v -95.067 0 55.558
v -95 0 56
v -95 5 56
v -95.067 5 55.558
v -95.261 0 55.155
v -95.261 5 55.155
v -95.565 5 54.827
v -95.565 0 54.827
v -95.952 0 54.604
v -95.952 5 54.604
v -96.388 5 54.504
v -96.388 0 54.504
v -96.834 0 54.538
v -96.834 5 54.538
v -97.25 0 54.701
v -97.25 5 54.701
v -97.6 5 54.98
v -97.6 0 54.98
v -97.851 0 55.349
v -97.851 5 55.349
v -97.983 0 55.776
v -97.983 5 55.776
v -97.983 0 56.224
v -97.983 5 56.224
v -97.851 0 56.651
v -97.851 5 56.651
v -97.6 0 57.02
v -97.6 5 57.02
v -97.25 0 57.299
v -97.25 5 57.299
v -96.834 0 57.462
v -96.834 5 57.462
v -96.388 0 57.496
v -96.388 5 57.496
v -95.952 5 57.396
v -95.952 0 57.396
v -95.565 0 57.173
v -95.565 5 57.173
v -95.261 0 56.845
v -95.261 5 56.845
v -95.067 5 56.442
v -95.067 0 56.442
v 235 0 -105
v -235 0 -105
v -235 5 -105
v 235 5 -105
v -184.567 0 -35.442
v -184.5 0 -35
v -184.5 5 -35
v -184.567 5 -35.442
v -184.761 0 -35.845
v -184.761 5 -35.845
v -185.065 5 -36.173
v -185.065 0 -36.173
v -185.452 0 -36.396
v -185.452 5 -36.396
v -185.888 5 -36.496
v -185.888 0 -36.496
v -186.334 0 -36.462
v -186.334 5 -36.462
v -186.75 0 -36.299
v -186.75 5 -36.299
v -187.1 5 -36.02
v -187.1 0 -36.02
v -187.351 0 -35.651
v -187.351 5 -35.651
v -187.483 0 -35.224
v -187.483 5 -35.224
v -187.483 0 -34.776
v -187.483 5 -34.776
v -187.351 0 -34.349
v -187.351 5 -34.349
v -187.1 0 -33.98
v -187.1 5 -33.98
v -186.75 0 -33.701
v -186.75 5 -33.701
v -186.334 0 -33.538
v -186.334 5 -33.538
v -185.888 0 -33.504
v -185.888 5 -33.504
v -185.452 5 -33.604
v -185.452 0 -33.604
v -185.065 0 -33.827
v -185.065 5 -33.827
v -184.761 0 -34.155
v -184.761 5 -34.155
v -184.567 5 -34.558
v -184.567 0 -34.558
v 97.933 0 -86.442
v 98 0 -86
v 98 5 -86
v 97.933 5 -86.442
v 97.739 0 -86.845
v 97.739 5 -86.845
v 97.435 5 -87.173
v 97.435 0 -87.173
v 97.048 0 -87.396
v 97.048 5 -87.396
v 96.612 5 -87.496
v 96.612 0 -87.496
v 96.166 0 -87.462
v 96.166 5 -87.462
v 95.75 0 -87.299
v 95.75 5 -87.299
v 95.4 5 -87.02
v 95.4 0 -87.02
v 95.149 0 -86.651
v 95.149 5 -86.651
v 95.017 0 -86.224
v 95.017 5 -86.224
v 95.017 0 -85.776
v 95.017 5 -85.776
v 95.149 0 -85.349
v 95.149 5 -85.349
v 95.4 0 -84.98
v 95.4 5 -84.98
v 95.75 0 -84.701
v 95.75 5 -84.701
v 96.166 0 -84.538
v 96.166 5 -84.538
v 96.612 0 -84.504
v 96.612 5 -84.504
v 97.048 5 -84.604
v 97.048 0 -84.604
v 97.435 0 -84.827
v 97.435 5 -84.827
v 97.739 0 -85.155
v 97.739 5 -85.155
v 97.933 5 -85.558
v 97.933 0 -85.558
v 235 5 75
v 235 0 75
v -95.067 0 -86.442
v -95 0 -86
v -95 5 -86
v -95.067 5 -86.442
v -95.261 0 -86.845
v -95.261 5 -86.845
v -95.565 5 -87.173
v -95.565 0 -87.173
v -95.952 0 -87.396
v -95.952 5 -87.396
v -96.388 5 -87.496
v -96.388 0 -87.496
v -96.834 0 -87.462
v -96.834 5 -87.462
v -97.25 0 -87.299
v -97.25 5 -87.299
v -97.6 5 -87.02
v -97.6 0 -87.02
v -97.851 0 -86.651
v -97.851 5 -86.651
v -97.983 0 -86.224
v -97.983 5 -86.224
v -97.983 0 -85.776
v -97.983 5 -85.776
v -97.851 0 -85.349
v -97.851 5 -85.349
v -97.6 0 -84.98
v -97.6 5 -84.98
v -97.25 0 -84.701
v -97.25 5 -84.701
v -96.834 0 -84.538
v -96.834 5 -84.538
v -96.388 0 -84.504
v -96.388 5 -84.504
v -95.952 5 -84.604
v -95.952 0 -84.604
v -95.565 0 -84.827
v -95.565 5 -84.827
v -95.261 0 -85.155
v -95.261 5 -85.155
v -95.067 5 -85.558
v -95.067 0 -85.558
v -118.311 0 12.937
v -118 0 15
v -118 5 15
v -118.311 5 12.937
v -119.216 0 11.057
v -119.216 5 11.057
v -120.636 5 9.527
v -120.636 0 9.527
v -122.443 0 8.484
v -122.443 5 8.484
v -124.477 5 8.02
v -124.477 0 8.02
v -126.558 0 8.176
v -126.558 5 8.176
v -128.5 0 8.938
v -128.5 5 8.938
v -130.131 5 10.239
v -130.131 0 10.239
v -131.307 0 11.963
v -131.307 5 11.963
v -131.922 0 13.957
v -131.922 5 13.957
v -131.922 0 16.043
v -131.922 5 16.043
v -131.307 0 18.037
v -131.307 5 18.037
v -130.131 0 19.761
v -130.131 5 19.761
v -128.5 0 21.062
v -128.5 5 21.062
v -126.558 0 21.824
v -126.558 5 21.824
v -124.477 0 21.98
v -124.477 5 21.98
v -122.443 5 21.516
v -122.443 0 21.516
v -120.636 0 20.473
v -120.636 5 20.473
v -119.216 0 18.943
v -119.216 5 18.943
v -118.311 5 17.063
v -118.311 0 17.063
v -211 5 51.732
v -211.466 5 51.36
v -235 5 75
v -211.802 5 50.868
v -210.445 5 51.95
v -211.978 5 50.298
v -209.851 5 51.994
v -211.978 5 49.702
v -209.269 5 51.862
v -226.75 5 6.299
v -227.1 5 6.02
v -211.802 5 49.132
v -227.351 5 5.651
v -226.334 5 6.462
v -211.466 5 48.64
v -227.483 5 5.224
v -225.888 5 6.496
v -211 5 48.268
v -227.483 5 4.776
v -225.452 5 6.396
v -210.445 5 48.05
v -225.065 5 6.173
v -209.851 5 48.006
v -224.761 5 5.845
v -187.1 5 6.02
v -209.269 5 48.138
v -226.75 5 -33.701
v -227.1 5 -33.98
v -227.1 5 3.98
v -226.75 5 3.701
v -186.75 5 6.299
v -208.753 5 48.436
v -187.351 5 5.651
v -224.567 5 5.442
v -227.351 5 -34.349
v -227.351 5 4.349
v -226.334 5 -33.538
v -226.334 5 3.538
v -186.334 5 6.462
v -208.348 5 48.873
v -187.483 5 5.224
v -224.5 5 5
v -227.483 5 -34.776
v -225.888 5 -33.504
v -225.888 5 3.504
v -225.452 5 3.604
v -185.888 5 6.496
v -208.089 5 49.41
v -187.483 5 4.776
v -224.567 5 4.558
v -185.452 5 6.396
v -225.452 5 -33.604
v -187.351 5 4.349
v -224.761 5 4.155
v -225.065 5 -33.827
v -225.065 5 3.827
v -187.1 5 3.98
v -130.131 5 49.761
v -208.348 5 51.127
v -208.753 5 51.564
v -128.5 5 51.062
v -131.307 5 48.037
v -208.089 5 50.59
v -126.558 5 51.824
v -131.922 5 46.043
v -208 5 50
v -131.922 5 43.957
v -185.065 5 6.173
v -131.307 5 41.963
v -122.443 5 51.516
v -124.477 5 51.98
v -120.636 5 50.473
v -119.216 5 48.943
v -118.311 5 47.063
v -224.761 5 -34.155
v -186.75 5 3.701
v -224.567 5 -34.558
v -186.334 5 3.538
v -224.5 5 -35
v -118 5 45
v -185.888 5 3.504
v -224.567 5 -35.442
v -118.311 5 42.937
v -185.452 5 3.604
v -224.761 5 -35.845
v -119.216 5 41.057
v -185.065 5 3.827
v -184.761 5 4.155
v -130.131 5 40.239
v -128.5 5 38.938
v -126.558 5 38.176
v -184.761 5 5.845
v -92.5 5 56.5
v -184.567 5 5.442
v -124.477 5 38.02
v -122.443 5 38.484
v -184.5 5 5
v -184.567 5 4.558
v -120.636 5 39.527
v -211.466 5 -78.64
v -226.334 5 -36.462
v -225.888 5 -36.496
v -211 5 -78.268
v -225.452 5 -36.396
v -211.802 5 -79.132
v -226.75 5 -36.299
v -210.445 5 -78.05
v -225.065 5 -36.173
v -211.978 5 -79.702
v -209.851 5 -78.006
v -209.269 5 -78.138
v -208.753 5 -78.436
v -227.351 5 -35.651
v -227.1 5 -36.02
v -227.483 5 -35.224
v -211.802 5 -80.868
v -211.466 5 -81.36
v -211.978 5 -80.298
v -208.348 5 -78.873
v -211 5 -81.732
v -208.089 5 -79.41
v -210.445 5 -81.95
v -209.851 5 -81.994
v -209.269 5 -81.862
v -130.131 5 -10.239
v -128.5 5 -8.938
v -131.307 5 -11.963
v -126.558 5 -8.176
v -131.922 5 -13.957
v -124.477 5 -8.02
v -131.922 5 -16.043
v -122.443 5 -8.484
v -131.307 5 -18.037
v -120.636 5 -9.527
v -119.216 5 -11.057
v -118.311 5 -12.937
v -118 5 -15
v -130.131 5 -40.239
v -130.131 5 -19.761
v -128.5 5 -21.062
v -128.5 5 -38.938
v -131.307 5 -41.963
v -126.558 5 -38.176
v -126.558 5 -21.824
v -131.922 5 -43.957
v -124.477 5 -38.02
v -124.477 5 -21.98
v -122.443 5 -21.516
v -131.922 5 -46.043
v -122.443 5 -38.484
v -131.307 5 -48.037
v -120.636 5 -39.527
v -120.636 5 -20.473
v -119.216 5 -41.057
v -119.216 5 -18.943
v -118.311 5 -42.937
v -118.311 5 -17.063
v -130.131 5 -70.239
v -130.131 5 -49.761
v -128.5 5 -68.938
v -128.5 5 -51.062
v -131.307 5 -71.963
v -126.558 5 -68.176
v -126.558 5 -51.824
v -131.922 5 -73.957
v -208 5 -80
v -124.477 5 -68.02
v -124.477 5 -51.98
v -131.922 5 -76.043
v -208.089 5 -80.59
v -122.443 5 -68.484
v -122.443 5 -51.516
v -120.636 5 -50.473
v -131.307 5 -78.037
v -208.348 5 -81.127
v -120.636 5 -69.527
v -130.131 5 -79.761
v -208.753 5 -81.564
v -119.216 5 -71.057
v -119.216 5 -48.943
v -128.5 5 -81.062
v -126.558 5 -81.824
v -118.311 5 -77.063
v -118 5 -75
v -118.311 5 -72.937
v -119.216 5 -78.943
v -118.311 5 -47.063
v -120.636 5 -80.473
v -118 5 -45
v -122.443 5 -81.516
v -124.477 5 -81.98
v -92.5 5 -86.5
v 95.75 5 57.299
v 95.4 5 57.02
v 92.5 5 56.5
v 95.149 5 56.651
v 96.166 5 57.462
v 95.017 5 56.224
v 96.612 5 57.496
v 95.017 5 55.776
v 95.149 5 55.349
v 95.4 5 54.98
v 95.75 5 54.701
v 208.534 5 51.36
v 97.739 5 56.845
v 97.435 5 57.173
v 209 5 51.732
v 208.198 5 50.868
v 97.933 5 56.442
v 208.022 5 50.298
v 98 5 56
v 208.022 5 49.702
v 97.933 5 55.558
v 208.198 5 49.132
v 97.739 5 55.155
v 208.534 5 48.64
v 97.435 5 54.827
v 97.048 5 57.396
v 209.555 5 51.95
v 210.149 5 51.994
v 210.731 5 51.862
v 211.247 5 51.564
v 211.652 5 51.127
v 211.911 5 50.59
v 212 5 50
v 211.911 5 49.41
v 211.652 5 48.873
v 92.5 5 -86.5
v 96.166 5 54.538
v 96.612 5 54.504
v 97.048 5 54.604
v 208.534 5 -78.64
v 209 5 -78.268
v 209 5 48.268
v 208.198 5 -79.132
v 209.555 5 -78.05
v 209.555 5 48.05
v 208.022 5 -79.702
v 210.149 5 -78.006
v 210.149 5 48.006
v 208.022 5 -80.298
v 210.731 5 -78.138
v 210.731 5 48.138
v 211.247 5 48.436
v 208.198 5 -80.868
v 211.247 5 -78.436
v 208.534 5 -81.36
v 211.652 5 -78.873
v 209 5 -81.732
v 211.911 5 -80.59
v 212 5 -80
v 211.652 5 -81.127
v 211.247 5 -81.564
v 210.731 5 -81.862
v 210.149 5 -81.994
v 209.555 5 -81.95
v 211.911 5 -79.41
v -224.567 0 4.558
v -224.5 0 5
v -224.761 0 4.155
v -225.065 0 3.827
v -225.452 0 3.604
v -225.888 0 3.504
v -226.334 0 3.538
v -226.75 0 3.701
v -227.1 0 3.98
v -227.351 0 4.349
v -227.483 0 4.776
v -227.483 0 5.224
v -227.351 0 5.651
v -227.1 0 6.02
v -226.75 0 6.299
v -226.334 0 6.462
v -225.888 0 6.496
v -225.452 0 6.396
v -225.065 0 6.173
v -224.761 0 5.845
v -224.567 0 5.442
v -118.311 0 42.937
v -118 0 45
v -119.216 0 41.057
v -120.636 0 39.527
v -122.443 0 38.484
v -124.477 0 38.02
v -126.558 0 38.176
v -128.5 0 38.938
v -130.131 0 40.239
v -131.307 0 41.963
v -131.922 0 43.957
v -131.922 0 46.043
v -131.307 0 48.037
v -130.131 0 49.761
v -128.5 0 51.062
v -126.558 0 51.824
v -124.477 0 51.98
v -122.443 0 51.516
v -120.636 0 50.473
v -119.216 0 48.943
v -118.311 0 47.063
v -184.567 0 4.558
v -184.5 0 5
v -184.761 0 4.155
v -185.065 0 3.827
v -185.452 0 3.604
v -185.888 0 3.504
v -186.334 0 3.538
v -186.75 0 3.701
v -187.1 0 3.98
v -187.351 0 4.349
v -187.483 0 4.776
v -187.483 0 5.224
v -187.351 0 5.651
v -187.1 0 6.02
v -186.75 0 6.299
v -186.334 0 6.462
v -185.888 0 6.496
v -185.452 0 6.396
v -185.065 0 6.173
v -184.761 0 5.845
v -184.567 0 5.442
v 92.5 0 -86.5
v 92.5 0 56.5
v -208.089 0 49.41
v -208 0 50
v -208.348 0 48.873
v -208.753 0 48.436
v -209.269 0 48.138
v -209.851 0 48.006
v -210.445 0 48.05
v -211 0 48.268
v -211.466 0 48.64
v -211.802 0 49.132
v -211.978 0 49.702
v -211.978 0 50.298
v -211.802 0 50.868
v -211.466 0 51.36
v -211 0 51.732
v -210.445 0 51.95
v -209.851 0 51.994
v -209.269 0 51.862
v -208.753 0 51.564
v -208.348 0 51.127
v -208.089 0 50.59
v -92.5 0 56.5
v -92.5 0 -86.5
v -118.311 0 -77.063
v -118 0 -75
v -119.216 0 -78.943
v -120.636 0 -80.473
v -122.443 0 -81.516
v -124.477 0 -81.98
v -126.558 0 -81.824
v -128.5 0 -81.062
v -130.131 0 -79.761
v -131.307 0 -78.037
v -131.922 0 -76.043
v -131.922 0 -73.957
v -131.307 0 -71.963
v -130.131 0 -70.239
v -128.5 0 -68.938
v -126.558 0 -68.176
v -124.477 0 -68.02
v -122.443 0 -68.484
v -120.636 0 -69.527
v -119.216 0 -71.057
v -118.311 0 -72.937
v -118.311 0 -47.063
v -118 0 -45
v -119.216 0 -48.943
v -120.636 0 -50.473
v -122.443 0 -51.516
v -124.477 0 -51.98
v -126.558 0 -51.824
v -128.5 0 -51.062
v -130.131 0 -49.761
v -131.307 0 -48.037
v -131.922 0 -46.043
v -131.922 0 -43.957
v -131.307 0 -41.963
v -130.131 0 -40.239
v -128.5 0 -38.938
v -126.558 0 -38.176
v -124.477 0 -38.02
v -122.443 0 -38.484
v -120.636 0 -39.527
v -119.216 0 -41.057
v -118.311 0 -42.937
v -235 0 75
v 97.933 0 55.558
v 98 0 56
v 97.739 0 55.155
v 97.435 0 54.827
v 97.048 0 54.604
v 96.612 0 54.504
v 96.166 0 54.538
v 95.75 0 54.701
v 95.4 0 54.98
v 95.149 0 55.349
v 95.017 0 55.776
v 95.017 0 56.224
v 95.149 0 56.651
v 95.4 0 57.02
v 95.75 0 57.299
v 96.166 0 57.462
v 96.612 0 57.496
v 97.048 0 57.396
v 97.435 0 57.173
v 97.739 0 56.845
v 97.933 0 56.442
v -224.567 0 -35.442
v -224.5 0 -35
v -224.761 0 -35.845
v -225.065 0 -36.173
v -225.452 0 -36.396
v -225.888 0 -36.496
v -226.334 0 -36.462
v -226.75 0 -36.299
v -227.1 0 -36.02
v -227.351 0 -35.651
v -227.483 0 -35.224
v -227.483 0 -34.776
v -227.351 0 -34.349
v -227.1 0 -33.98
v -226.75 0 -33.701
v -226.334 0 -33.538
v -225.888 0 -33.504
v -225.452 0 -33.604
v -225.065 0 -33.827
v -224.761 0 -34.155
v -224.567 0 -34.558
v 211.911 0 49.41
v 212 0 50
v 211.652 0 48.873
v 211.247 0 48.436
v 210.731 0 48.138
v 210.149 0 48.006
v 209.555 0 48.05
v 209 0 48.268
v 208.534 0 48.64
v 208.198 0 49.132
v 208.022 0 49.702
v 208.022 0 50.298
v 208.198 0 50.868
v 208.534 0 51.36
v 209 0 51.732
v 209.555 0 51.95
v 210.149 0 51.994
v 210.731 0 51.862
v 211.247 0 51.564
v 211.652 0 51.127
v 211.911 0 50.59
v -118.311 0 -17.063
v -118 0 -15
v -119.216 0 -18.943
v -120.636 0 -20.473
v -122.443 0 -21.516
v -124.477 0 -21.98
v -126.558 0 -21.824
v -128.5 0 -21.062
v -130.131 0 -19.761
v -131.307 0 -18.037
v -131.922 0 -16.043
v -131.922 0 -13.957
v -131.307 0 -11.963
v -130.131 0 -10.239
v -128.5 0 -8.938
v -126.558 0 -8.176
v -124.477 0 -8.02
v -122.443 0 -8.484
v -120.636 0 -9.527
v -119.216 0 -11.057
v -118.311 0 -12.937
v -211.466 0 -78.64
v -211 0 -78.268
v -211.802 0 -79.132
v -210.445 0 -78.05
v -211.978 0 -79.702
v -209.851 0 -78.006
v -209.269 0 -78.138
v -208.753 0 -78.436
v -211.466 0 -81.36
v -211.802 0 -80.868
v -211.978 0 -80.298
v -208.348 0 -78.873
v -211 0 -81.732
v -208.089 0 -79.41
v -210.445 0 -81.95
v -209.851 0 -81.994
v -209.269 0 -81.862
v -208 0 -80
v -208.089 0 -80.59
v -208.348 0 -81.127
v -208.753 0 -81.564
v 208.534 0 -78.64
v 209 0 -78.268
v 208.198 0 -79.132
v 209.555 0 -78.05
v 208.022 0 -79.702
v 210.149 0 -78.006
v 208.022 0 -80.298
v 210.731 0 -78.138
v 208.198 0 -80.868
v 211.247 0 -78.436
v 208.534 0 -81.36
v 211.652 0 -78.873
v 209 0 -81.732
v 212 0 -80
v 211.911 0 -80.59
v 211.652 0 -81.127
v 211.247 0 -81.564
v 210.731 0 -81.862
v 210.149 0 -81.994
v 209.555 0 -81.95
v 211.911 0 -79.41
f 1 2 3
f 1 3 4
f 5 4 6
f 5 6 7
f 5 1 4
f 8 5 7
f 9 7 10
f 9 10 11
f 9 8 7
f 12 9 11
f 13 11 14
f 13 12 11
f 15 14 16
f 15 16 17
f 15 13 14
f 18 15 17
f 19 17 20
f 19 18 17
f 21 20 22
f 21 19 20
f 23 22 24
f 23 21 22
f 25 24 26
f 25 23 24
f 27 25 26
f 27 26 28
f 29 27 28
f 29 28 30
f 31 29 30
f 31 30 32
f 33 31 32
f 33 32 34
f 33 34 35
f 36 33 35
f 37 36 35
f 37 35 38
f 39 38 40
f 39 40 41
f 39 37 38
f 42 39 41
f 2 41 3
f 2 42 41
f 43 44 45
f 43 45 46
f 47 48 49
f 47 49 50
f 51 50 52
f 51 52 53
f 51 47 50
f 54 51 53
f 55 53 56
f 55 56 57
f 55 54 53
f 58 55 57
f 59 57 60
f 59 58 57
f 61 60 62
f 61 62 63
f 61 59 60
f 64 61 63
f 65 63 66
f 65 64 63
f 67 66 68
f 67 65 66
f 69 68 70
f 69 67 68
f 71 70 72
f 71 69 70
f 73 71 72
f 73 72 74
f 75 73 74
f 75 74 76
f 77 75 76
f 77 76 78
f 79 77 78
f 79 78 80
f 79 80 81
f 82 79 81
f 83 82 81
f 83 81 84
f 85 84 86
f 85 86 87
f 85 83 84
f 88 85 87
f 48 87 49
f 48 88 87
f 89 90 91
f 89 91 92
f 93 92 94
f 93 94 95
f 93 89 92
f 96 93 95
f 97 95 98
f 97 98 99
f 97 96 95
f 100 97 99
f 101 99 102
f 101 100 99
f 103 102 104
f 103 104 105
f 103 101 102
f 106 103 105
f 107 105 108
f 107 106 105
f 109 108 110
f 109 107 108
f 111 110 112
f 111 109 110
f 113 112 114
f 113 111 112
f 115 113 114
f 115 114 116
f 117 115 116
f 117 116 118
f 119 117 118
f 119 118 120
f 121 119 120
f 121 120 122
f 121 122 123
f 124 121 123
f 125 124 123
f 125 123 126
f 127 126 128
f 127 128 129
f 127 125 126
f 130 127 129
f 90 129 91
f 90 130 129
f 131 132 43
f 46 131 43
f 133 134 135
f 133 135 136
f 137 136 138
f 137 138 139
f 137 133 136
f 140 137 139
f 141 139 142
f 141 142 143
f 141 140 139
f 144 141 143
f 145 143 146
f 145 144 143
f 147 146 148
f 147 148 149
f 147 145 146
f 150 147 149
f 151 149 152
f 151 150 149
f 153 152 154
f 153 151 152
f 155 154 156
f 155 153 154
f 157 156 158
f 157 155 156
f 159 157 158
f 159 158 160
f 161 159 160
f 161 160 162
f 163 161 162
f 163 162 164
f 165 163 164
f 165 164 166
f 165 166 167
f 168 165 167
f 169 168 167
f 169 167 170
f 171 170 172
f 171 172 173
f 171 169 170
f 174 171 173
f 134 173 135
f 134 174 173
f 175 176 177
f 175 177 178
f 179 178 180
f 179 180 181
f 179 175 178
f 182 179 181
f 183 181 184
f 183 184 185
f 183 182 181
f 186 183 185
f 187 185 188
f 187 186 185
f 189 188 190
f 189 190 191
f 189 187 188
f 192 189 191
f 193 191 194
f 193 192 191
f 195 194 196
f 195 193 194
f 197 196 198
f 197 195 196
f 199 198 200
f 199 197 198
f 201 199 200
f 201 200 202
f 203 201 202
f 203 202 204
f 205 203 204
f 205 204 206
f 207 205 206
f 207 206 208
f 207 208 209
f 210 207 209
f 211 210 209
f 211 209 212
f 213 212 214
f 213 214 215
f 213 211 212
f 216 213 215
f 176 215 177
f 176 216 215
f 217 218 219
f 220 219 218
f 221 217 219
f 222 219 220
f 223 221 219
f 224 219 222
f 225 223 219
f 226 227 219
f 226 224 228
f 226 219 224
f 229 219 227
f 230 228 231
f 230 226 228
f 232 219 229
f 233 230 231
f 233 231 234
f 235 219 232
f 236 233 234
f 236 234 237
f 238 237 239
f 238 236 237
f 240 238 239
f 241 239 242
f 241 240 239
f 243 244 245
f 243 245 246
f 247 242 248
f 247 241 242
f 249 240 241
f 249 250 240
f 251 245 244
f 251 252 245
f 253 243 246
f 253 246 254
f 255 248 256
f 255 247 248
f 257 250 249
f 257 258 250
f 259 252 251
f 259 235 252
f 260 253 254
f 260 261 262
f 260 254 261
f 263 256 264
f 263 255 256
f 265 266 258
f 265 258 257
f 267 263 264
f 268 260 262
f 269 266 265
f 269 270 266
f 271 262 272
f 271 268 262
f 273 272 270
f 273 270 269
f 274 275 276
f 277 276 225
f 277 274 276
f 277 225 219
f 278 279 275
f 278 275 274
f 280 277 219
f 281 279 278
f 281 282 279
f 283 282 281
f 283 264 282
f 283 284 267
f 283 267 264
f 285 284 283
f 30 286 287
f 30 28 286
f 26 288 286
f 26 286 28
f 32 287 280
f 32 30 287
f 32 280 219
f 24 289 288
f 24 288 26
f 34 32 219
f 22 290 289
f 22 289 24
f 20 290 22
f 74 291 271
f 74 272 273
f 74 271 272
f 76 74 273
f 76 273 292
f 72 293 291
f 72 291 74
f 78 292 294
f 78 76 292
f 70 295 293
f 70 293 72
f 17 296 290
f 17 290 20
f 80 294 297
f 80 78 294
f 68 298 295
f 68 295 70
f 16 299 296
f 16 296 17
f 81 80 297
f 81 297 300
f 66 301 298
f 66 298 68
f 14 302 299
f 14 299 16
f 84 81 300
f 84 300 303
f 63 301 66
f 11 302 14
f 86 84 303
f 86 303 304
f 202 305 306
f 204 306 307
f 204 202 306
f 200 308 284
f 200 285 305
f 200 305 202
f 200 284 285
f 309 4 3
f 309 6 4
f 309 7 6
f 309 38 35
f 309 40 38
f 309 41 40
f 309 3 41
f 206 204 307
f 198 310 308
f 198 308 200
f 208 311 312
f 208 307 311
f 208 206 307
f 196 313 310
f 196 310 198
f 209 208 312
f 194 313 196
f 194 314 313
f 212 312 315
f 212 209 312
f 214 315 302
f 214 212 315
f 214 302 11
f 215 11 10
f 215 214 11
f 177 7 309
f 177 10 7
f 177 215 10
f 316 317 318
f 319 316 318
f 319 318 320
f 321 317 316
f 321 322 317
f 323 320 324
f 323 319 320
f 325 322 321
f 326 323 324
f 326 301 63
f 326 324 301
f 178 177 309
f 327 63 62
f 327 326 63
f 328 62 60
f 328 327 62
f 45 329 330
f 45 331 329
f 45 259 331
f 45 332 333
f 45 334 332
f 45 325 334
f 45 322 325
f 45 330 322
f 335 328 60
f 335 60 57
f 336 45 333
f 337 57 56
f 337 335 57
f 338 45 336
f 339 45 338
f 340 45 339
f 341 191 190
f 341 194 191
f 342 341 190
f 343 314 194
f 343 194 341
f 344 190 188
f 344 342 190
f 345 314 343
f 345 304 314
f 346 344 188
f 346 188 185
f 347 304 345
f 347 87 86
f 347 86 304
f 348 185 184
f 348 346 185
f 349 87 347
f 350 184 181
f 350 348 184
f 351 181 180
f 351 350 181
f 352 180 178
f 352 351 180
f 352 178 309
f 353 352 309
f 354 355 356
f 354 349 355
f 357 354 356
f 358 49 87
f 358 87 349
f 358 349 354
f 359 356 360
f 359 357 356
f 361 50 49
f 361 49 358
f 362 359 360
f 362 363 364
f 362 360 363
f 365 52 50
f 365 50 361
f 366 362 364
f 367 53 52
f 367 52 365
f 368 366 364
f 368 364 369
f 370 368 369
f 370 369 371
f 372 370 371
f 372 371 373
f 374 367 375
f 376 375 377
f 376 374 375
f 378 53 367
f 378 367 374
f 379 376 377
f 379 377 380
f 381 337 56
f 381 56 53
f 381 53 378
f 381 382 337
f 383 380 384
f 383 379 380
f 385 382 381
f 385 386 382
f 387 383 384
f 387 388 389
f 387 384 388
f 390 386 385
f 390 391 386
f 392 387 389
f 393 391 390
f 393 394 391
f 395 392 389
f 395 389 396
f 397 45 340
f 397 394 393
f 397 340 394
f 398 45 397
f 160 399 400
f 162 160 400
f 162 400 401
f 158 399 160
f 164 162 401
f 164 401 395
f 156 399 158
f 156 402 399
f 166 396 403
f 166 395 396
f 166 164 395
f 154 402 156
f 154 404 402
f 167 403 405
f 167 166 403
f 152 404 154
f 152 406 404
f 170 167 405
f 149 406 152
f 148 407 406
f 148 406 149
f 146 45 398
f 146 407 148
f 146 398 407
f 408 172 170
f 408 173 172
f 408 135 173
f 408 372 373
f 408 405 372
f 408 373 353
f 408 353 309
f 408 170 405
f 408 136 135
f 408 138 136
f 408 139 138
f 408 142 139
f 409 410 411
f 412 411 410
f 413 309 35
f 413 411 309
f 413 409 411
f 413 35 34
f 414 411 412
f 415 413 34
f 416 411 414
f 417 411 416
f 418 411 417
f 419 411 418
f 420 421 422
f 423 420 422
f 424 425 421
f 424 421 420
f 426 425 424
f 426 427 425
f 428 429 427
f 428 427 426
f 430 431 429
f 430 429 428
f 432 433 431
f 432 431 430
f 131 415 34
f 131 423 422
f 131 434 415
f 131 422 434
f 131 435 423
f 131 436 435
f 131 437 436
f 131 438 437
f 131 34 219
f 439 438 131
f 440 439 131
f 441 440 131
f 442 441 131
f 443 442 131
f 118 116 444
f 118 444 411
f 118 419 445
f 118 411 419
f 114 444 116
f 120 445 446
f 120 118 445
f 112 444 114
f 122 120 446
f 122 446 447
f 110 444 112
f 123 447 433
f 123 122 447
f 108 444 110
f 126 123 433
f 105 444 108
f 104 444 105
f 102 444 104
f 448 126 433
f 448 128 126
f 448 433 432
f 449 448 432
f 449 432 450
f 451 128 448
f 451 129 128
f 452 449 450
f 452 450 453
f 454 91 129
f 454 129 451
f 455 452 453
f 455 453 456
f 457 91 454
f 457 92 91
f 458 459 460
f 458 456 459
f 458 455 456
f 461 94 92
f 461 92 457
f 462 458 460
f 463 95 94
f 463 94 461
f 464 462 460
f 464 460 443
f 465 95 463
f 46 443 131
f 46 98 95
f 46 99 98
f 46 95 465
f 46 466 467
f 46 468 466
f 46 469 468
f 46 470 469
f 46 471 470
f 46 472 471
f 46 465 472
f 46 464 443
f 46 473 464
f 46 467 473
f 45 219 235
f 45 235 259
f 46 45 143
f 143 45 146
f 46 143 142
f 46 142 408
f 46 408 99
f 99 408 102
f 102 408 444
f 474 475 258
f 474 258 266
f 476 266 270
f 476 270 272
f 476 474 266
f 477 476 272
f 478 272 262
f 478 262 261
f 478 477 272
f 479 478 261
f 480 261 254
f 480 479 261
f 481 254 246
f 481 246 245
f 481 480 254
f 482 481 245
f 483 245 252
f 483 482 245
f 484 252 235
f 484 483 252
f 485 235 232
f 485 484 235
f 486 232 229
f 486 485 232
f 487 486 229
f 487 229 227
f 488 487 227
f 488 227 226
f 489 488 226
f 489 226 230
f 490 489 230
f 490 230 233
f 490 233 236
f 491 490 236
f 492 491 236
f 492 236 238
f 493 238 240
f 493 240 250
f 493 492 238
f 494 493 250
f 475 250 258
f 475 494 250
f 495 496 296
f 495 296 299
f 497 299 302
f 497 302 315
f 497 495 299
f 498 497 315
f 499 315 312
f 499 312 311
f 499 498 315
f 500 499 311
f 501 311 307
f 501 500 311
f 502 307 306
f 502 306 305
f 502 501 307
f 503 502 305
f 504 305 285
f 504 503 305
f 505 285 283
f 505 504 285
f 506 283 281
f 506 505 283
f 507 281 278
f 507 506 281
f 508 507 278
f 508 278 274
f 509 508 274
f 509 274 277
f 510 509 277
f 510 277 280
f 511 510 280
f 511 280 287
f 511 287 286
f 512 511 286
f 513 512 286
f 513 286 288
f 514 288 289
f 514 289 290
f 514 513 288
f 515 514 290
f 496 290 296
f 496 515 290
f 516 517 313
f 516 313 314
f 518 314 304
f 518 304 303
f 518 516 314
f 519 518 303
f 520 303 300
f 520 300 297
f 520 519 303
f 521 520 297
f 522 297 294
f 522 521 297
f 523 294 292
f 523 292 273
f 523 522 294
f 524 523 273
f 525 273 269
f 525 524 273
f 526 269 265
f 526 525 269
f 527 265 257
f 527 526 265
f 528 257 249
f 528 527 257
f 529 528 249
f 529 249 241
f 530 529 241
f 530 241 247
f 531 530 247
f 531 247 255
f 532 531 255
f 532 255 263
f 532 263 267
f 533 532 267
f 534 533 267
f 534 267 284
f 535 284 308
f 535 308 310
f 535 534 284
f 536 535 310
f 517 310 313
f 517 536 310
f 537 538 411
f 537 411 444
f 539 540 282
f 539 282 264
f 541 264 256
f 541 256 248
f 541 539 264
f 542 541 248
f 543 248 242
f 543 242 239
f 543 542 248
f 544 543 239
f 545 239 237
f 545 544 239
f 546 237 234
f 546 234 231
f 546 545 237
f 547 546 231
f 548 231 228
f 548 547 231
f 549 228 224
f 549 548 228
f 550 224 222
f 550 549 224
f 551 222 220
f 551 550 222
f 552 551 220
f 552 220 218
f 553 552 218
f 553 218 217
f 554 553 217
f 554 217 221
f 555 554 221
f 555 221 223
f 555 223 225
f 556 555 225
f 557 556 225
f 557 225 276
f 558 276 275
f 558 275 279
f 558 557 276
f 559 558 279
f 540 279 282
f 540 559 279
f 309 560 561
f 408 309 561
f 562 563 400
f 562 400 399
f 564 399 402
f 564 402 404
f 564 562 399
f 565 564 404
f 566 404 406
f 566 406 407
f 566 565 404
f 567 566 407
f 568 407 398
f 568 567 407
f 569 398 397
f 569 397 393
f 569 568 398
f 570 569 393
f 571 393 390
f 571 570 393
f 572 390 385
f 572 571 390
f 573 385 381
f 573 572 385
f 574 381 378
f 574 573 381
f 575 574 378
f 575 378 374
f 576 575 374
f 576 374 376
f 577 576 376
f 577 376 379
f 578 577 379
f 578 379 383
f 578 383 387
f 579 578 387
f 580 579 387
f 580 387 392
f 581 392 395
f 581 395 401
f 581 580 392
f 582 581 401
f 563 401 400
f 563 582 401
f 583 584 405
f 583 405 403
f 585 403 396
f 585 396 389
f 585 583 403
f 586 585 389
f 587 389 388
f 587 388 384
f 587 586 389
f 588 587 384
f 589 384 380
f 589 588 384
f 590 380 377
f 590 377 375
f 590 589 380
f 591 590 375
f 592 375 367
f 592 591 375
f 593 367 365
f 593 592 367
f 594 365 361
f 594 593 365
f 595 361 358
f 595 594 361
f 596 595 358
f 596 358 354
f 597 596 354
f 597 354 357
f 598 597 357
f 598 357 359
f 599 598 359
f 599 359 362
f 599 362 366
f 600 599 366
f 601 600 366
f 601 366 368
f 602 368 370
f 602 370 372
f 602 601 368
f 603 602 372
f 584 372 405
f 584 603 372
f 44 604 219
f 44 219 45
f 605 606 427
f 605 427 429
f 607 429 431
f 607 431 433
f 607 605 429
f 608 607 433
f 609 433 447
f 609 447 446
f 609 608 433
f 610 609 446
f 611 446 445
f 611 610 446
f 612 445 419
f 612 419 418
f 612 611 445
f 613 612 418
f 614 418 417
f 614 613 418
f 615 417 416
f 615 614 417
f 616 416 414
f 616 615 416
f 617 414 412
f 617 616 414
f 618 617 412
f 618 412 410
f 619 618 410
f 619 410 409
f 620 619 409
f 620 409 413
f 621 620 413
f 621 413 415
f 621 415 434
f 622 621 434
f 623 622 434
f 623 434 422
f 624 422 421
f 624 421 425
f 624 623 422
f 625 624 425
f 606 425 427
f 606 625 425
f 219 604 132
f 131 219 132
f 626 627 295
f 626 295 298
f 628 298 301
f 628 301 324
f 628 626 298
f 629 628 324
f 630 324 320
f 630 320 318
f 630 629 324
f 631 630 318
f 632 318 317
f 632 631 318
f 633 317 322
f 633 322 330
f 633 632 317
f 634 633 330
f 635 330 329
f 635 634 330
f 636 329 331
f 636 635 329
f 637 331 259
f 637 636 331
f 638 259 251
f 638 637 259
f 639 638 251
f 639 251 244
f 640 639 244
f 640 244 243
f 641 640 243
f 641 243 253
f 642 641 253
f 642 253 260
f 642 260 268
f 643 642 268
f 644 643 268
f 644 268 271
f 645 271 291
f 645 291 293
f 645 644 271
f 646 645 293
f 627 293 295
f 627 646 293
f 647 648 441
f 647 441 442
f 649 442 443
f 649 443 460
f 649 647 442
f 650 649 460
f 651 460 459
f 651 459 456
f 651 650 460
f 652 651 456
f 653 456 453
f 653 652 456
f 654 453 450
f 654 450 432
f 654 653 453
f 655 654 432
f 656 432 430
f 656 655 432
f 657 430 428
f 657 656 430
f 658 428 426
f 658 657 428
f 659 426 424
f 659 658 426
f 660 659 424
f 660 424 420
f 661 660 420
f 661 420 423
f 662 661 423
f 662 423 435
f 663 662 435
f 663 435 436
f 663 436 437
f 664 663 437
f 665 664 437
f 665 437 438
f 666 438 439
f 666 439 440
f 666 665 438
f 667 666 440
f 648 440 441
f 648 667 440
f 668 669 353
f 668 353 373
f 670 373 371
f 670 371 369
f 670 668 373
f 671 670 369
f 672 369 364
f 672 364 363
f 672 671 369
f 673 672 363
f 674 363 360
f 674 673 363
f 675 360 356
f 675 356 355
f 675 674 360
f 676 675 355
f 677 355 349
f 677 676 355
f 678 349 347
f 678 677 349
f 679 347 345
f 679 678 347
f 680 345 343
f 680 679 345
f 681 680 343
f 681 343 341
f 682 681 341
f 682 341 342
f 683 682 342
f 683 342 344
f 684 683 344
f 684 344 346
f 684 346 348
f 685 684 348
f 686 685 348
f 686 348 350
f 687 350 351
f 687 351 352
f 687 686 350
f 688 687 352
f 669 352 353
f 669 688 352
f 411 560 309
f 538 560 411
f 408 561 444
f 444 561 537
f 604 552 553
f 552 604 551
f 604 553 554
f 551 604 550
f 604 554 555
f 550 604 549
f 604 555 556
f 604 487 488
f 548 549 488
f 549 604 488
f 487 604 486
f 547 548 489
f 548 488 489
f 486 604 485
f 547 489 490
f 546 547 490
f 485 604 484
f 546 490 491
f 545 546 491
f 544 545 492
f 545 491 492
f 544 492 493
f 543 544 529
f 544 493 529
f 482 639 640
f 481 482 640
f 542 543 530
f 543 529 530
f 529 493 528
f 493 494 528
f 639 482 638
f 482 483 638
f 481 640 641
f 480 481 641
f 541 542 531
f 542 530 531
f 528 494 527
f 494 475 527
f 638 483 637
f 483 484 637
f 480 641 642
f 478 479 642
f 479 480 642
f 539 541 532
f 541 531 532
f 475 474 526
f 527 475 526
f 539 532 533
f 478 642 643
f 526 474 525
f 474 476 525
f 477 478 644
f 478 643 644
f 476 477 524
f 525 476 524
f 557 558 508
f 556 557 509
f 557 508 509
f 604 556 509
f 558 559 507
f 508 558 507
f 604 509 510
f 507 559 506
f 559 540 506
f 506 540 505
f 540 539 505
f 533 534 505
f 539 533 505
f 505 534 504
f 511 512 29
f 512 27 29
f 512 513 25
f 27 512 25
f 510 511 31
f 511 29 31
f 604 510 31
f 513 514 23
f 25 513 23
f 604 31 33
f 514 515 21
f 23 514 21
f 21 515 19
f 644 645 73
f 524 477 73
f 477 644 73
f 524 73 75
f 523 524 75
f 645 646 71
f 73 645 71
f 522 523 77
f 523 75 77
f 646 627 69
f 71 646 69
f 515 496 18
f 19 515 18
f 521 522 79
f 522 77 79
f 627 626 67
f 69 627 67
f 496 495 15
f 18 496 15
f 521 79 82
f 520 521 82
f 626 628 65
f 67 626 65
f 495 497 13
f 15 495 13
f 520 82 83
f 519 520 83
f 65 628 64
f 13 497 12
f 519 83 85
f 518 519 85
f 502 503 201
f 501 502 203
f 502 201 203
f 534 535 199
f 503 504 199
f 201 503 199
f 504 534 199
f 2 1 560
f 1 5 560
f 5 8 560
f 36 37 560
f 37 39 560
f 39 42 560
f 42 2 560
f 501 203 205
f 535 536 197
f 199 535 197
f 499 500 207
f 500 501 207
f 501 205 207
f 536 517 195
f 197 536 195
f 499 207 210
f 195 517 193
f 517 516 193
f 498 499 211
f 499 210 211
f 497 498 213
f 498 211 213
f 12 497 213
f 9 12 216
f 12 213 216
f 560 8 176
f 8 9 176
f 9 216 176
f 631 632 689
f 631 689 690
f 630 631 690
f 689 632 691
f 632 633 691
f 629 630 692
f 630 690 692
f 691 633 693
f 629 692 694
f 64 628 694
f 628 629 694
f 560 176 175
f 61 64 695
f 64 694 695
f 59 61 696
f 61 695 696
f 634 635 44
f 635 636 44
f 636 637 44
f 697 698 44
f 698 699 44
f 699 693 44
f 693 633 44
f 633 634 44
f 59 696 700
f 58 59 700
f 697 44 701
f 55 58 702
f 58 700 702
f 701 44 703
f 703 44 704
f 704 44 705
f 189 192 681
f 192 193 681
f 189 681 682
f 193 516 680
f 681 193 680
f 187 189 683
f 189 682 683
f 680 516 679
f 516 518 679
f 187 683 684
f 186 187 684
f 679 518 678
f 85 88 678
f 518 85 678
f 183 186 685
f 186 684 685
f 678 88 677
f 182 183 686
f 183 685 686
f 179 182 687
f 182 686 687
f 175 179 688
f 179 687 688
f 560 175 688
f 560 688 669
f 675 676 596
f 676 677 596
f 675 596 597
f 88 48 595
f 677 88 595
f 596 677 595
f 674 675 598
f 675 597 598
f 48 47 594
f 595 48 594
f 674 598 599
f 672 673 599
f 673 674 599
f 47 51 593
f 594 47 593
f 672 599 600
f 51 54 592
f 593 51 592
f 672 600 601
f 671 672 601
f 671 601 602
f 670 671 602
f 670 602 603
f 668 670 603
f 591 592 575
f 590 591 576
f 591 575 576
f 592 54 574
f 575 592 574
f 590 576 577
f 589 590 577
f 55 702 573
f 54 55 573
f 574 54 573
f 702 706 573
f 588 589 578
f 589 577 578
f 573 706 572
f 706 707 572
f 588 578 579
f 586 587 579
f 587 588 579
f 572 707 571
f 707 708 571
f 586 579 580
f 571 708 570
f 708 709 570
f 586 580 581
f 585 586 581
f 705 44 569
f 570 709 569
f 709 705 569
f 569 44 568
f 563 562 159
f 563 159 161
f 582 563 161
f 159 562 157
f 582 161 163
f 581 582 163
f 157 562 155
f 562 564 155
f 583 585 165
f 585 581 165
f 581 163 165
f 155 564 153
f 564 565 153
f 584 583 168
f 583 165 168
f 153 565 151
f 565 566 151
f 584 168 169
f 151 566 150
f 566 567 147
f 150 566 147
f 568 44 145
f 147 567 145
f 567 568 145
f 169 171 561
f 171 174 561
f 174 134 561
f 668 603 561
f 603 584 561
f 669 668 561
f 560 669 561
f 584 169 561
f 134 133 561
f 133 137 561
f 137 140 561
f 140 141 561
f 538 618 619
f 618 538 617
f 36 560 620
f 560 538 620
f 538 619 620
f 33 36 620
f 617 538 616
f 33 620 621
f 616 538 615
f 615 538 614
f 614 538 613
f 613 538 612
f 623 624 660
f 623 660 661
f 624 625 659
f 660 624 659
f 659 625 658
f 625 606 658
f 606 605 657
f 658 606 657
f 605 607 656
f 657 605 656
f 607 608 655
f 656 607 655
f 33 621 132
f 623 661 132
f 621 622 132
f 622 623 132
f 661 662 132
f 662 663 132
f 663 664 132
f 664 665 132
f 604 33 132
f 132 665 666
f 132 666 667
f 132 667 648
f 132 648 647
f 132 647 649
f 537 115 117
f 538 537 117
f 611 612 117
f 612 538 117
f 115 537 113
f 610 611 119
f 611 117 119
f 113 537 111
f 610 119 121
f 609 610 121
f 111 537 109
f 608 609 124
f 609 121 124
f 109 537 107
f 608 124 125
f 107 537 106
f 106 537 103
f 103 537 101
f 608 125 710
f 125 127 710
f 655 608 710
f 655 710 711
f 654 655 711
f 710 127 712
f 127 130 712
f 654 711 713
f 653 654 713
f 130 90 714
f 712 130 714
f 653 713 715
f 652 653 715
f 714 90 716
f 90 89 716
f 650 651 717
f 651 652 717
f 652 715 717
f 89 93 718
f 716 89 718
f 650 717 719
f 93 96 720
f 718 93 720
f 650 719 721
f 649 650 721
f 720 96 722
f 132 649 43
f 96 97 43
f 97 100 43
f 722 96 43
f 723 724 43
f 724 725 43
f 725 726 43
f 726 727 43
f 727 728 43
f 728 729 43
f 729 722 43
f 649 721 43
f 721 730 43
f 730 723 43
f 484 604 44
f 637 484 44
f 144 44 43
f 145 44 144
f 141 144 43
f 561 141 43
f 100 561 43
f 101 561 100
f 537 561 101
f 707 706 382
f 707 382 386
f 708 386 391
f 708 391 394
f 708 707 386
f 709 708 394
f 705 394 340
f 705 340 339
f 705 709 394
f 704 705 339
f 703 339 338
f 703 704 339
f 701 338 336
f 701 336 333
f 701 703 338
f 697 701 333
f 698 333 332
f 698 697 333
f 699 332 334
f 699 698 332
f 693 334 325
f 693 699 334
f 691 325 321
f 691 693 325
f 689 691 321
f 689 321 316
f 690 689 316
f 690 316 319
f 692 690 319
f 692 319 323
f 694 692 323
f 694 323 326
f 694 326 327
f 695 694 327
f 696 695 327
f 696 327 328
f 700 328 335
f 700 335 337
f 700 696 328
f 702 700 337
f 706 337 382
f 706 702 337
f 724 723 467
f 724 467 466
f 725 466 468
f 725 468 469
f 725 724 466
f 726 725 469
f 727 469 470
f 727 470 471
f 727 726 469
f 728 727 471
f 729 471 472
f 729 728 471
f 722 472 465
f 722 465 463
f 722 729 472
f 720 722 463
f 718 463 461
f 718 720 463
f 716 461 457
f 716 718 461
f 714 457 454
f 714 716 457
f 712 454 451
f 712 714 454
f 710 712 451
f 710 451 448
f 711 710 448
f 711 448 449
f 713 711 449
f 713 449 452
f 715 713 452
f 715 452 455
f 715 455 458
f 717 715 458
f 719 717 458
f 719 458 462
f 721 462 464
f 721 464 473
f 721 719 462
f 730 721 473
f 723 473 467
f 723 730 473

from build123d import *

# Parameters (mm, degrees)
SKETCH_1_W      = 470
SKETCH_1_H      = 180
SKETCH_1_R      = 1.5
SKETCH_1_R_2    = 7
SKETCH_1_R_3    = 2
SKETCH_1_W_2    = 185
SKETCH_1_H_2    = 143
EXTRUDE_1_DEPTH = 5


with BuildPart() as part:
    # 草图1 → 凸台-拉伸1 (new body)
    with BuildSketch(Plane(origin=(0, 0, 0), x_dir=(1, 0, 0), z_dir=(0, 1, 0))):
        with Locations((0, 15)):
            Rectangle(SKETCH_1_W, SKETCH_1_H)
        with Locations((-96.5, 86)):
            Circle(SKETCH_1_R, mode=Mode.SUBTRACT)
        with Locations((96.5, 86)):
            Circle(SKETCH_1_R, mode=Mode.SUBTRACT)
        with Locations((96.5, -56)):
            Circle(SKETCH_1_R, mode=Mode.SUBTRACT)
        with Locations((-96.5, -56)):
            Circle(SKETCH_1_R, mode=Mode.SUBTRACT)
        with Locations((-125, 75)):
            Circle(SKETCH_1_R_2, mode=Mode.SUBTRACT)
        with Locations((-125, 45)):
            Circle(SKETCH_1_R_2, mode=Mode.SUBTRACT)
        with Locations((-125, 15)):
            Circle(SKETCH_1_R_2, mode=Mode.SUBTRACT)
        with Locations((-125, -15)):
            Circle(SKETCH_1_R_2, mode=Mode.SUBTRACT)
        with Locations((-125, -45)):
            Circle(SKETCH_1_R_2, mode=Mode.SUBTRACT)
        with Locations((-226, 35)):
            Circle(SKETCH_1_R, mode=Mode.SUBTRACT)
        with Locations((-186, 35)):
            Circle(SKETCH_1_R, mode=Mode.SUBTRACT)
        with Locations((-186, -5)):
            Circle(SKETCH_1_R, mode=Mode.SUBTRACT)
        with Locations((-226, -5)):
            Circle(SKETCH_1_R, mode=Mode.SUBTRACT)
        with Locations((-210, -50)):
            Circle(SKETCH_1_R_3, mode=Mode.SUBTRACT)
        with Locations((210, -50)):
            Circle(SKETCH_1_R_3, mode=Mode.SUBTRACT)
        with Locations((-210, 80)):
            Circle(SKETCH_1_R_3, mode=Mode.SUBTRACT)
        with Locations((210, 80)):
            Circle(SKETCH_1_R_3, mode=Mode.SUBTRACT)
        with Locations((0, 15)):
            Rectangle(SKETCH_1_W_2, SKETCH_1_H_2, mode=Mode.SUBTRACT)
    extrude(amount=EXTRUDE_1_DEPTH)


solid = part.part
